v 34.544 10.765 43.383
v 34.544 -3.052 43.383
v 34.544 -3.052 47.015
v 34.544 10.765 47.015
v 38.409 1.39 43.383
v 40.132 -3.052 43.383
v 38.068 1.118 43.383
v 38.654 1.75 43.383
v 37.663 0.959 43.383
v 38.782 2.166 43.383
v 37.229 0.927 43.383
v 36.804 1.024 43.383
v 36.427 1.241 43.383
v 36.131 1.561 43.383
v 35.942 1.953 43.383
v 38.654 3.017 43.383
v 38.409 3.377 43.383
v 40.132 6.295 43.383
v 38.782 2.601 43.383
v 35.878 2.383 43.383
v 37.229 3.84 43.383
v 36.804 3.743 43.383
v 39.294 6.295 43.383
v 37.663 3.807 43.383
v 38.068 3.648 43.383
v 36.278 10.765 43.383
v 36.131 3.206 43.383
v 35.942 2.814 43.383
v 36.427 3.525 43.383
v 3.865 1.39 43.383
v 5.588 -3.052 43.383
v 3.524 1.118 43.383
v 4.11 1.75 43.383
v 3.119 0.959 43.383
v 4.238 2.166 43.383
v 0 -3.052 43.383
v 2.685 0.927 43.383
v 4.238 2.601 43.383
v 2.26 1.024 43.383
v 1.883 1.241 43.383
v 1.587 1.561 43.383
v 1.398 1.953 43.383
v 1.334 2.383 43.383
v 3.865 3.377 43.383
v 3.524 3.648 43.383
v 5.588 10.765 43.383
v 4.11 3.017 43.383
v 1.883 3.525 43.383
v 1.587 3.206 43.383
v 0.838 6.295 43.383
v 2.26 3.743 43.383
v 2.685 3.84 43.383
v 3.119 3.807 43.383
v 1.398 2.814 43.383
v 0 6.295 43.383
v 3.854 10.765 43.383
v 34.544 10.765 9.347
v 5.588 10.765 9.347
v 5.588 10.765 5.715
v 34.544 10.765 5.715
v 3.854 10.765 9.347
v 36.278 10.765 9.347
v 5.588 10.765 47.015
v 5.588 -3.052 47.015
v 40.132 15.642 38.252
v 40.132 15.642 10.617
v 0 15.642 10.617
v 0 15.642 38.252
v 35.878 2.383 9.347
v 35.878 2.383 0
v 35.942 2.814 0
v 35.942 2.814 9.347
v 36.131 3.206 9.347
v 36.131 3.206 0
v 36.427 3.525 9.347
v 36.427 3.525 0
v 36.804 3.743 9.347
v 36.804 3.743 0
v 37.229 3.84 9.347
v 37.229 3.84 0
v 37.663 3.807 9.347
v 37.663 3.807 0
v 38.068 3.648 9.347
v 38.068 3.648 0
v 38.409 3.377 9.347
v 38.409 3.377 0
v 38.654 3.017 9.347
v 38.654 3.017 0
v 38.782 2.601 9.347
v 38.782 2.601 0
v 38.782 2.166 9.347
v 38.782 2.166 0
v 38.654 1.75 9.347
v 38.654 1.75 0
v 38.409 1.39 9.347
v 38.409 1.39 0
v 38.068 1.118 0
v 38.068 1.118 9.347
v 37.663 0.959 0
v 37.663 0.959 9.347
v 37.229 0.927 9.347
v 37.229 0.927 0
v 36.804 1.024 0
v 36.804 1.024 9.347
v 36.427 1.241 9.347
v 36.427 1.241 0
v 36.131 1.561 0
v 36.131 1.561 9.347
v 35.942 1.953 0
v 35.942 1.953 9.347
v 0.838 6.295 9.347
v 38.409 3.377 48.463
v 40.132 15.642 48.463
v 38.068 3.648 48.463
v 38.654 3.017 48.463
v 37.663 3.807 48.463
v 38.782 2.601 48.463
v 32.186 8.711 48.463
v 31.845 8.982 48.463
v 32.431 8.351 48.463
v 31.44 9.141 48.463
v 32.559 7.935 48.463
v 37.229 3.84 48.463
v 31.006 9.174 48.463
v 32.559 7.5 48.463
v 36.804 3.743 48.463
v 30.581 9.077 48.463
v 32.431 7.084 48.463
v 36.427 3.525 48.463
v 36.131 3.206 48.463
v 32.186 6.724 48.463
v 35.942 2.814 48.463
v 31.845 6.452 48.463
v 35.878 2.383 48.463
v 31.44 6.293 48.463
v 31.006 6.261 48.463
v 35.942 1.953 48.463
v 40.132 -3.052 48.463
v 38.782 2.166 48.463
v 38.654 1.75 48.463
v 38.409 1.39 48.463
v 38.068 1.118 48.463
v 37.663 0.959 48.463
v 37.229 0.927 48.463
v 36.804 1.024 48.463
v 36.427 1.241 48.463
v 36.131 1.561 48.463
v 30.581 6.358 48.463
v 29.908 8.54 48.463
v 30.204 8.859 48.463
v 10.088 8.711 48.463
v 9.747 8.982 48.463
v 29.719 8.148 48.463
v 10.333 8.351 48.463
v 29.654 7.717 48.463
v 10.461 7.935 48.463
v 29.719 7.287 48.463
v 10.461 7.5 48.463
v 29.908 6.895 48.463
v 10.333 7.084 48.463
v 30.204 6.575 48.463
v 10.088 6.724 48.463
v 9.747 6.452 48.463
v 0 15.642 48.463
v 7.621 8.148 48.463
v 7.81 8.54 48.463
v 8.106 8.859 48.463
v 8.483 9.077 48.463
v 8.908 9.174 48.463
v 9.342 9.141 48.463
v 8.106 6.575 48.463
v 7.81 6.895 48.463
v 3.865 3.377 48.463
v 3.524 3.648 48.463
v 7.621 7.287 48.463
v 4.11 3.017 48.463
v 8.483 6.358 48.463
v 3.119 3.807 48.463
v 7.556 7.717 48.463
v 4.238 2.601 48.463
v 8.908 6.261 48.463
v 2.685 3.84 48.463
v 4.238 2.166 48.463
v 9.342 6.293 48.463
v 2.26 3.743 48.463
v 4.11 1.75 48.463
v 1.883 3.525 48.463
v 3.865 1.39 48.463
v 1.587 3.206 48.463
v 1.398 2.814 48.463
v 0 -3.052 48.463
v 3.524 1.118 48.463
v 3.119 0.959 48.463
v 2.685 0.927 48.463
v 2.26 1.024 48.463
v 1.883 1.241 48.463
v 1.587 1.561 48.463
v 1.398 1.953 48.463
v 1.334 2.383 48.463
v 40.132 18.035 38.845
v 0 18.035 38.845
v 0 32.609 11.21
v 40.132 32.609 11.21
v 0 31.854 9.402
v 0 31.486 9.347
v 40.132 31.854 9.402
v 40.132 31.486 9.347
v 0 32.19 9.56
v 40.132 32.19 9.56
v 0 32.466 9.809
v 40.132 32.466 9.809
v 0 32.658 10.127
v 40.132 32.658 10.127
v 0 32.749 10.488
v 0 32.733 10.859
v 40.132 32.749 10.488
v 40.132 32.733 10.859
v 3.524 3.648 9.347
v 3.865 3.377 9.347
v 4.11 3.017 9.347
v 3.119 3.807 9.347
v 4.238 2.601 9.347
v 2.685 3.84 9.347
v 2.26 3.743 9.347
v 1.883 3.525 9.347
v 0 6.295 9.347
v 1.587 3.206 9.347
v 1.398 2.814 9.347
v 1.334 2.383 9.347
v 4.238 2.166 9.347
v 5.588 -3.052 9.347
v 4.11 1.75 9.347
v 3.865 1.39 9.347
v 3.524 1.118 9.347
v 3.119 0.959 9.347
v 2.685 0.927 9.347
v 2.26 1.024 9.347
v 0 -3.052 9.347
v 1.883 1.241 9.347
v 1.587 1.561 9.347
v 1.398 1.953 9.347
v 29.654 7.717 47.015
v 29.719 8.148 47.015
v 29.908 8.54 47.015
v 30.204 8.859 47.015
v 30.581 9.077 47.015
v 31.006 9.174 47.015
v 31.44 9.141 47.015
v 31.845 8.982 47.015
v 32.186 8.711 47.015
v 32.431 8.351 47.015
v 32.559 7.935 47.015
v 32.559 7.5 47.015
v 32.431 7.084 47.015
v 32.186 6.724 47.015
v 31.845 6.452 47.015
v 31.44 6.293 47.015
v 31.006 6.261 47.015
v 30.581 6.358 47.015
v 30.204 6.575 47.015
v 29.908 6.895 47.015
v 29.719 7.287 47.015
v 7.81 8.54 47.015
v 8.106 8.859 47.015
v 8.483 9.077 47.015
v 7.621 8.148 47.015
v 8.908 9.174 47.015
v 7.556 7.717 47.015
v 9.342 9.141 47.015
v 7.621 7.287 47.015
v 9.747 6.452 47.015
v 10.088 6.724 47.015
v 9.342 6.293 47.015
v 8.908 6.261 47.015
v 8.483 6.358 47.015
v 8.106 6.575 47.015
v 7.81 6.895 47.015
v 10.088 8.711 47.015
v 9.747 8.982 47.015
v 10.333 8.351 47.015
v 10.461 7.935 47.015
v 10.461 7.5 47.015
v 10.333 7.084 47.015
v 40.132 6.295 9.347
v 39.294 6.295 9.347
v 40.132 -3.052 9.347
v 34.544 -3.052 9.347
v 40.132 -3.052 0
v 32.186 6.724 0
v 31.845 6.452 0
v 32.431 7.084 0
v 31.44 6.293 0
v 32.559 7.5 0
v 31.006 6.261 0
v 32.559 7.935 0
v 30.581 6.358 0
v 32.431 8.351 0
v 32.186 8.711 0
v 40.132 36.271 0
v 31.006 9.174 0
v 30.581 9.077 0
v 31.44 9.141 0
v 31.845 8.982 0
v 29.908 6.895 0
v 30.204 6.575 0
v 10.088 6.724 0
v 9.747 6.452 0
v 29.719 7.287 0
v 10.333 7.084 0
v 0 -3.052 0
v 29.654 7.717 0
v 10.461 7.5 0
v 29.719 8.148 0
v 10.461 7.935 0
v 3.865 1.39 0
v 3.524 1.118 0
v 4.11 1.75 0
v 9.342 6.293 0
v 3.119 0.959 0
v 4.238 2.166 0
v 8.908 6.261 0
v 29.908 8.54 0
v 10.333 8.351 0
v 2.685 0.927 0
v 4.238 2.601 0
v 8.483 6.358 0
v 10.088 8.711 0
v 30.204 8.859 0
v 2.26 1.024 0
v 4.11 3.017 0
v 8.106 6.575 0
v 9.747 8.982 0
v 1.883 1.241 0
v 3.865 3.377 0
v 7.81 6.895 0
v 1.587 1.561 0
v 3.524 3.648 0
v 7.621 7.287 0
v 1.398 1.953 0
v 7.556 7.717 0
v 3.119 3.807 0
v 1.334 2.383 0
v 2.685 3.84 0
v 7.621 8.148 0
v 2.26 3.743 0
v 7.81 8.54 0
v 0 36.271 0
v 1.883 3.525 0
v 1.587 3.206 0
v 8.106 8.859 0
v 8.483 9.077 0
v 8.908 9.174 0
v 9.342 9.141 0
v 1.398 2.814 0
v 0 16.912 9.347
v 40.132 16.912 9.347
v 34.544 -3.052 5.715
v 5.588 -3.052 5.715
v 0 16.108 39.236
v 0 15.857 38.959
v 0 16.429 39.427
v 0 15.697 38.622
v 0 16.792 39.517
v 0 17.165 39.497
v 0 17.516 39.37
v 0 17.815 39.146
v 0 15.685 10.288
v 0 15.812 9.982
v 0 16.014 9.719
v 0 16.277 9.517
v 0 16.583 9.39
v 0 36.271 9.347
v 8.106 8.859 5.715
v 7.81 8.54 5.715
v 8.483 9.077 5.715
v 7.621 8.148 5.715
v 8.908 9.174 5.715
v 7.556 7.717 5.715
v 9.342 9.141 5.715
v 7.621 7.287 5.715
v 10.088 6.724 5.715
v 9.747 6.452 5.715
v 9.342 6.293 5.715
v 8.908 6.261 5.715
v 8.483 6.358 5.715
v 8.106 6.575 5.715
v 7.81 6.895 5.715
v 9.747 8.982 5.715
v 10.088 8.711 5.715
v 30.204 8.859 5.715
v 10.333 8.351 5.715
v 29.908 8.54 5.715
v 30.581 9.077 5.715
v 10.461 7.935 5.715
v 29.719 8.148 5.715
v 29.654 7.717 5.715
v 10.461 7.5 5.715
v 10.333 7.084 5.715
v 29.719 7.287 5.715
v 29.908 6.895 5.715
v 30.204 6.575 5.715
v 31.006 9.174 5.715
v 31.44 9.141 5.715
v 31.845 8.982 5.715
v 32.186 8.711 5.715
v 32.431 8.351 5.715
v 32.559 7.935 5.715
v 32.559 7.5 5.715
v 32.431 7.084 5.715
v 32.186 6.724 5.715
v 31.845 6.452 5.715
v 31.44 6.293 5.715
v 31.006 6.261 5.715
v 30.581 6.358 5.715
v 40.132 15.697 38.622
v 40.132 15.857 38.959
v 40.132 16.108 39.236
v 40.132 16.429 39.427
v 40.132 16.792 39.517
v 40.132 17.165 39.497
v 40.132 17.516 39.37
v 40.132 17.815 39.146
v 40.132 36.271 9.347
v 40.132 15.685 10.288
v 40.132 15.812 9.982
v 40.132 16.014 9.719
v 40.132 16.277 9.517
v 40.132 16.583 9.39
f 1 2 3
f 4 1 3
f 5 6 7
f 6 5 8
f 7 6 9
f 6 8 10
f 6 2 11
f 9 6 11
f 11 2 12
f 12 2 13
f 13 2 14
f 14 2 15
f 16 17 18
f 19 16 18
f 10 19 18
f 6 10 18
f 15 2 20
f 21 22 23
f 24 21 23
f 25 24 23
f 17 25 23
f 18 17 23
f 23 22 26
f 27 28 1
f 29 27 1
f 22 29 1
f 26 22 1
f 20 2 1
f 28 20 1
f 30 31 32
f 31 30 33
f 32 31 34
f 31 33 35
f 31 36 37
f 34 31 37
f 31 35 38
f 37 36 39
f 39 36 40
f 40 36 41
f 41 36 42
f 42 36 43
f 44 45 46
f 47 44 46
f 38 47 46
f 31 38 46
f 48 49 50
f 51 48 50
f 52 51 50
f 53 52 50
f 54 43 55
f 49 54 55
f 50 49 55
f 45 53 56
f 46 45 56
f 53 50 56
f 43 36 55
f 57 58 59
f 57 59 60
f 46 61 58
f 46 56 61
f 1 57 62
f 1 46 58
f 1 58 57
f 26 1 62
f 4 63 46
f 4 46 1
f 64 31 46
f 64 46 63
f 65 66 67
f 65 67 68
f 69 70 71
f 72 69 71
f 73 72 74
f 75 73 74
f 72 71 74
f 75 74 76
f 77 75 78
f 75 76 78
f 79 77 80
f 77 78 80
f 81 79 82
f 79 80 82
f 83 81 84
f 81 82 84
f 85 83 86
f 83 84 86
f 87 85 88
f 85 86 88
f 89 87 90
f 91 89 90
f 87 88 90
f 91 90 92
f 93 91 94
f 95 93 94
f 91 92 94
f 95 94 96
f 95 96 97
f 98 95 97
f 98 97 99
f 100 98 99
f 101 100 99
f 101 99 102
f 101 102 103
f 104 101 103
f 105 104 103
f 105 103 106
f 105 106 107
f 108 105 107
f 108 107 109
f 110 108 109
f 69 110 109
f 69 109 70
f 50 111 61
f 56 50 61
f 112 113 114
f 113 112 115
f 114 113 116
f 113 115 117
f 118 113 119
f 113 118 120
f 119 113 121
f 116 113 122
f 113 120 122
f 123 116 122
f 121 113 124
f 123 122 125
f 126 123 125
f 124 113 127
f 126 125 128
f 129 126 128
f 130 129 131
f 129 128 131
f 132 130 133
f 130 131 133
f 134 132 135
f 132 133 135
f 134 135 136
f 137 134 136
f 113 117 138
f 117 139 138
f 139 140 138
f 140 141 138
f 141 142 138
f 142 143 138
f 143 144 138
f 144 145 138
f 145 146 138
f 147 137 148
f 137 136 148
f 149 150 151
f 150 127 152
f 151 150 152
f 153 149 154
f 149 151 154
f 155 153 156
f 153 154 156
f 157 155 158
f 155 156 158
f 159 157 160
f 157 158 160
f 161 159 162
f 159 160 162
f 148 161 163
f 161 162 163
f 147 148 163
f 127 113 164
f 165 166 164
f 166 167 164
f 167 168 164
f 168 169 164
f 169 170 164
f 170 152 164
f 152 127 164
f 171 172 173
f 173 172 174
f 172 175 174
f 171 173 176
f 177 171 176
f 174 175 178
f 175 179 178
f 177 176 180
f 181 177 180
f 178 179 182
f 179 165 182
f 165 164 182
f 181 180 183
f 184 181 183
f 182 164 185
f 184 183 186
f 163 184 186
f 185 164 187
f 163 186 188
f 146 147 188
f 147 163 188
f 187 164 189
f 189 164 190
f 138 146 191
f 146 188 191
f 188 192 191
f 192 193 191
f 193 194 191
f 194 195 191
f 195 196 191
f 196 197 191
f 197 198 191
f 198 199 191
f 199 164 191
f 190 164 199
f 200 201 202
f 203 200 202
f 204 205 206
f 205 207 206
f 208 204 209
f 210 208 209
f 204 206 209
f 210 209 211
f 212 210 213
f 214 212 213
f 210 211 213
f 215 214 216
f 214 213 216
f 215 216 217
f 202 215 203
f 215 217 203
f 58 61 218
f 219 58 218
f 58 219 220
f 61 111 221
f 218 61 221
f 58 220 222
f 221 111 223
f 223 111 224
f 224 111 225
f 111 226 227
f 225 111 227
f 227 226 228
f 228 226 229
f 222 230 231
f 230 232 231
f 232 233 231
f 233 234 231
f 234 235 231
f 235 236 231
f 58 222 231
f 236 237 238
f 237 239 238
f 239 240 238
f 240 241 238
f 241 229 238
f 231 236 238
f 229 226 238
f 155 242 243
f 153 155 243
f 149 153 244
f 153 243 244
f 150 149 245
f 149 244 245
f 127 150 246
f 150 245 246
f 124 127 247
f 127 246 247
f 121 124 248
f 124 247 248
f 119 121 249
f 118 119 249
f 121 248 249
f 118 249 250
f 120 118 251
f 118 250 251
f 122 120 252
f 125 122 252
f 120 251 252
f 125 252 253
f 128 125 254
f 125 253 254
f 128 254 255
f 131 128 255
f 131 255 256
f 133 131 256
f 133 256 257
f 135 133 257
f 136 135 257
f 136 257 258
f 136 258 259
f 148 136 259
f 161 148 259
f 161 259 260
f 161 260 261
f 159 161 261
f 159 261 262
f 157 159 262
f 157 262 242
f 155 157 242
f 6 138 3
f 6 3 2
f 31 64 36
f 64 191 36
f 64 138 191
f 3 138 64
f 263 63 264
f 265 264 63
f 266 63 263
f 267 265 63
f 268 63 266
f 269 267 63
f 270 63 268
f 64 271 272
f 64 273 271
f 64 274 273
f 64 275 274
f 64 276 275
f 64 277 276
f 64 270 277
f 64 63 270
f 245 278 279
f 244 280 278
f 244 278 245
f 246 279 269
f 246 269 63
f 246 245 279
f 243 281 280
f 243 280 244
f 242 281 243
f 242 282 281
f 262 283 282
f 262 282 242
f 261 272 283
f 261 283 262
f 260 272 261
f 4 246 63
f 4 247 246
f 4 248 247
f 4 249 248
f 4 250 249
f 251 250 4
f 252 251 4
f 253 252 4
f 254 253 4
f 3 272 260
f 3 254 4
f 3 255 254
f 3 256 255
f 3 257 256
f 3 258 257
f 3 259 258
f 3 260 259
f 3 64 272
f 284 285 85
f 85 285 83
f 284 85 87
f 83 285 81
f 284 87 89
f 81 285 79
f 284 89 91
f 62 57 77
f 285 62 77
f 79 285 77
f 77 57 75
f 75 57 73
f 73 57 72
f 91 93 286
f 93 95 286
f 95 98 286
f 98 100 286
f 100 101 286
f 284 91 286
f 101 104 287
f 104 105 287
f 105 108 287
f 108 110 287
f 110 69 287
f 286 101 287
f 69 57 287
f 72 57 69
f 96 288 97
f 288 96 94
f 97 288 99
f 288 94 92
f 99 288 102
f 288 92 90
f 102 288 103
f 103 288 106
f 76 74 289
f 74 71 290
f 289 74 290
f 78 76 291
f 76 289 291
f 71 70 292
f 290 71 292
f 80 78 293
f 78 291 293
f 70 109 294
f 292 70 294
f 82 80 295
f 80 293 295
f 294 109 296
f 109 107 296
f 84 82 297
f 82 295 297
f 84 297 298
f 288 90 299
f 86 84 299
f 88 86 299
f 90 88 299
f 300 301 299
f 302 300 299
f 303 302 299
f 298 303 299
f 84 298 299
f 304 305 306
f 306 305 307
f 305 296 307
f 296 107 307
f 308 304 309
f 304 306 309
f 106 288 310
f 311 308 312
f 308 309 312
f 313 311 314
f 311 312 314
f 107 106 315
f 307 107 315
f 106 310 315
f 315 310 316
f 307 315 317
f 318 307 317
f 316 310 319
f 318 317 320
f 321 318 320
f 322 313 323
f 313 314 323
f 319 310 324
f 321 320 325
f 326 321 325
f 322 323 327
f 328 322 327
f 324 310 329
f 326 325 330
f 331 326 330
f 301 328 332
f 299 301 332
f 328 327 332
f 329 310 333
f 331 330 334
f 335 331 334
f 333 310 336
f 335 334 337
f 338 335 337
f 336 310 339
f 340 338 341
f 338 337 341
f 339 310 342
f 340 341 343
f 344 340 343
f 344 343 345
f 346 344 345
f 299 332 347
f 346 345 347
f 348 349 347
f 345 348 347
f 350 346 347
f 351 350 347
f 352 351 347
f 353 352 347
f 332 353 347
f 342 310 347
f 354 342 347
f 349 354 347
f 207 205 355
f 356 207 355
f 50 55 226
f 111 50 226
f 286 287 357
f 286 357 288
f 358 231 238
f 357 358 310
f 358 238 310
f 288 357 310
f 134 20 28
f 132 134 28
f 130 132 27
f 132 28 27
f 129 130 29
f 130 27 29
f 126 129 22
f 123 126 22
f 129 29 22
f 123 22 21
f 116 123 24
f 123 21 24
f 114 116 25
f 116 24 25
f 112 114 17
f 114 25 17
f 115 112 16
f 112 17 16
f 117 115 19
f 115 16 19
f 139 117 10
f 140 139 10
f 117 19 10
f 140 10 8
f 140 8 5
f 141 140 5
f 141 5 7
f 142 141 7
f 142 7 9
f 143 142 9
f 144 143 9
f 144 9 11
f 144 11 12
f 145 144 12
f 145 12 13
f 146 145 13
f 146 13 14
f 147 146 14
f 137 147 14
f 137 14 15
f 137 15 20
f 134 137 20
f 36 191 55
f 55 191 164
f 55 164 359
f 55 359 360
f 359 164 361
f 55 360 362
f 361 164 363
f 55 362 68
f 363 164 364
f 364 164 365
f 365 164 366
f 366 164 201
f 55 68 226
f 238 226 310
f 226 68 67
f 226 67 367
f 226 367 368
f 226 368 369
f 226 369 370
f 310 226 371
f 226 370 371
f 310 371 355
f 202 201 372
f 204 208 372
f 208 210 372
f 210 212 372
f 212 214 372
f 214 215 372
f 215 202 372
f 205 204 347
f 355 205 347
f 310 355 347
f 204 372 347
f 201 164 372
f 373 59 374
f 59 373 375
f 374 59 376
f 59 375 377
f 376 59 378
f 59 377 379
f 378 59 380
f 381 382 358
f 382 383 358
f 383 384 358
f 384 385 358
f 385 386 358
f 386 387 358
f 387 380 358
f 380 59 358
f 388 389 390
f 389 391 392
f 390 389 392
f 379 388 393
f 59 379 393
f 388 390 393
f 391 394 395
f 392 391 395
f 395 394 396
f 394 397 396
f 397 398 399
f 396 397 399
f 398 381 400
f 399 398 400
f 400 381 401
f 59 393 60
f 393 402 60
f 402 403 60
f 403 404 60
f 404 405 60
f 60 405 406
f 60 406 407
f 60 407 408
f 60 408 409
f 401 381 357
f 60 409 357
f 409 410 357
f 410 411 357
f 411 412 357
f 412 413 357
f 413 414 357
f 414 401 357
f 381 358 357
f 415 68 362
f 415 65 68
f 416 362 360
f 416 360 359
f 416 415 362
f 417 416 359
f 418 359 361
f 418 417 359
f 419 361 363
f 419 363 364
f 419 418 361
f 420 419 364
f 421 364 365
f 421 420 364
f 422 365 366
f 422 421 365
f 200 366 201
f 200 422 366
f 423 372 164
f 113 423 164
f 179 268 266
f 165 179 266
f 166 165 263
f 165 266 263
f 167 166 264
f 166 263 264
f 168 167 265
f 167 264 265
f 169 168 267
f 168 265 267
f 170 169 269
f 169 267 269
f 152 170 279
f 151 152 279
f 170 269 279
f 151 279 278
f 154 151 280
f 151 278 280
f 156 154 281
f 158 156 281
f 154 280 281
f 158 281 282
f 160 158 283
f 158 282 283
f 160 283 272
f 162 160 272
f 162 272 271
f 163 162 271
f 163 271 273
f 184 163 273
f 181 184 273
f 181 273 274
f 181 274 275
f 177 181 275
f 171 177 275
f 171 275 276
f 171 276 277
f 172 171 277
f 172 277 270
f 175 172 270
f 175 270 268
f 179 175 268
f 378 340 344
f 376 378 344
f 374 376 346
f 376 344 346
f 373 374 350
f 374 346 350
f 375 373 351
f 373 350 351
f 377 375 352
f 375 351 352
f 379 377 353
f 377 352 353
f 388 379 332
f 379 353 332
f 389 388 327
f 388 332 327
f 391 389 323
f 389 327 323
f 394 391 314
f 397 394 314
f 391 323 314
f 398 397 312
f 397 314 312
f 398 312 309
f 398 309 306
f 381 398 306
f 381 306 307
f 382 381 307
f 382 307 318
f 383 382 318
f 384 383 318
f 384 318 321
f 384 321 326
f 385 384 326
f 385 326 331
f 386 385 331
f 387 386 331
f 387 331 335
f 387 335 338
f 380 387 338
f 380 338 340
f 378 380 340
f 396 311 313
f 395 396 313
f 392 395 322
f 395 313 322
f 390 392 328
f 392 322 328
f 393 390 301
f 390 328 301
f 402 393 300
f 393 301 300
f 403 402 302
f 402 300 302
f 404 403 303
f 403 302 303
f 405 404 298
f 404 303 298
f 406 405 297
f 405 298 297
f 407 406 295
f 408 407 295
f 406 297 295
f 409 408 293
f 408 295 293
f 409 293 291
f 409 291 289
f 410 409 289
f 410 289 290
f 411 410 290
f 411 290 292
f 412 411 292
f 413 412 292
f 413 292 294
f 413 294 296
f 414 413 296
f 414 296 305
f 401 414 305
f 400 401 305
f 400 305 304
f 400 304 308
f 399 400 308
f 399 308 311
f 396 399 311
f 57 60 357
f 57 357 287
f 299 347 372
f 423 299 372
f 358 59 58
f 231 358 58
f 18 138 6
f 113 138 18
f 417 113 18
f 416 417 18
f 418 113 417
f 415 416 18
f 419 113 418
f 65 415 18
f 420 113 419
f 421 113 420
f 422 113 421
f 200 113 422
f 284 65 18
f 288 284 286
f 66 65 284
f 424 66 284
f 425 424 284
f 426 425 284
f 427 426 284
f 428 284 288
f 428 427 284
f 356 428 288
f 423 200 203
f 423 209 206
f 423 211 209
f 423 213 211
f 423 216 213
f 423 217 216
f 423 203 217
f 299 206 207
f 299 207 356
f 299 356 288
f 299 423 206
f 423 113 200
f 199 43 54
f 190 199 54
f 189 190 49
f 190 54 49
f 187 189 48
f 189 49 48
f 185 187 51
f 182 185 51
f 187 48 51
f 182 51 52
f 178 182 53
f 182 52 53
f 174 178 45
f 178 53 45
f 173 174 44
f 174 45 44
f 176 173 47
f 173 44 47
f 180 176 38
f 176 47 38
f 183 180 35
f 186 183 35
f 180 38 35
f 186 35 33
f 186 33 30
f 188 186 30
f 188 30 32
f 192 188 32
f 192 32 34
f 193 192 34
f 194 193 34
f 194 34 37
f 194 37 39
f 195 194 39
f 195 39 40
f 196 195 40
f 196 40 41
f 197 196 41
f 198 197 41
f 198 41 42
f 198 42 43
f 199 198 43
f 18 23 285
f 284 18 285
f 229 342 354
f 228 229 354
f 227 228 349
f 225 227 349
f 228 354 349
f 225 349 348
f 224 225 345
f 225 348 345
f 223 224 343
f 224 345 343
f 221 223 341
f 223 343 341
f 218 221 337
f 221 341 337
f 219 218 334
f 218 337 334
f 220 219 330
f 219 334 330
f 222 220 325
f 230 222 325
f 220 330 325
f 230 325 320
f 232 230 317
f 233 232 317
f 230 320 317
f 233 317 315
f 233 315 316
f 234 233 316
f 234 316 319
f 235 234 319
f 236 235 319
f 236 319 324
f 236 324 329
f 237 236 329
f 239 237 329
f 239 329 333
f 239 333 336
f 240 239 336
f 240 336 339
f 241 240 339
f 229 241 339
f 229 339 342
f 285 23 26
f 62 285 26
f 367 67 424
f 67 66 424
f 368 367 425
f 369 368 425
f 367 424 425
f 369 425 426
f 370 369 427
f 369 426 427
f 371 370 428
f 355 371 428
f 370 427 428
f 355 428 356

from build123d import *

# Parameters (mm, degrees)
BOSS_EXTRUDE1_DEPTH = 40.132
FILLET1_R           = 1.27
SKETCH2_W           = 28.2956
SKETCH2_H           = 34.036
CUT_EXTRUDE1_DEPTH  = 4.4704
CHAMFER1_SIZE       = 5.08
CHAMFER1_SIZE_2     = 7.53140972
SKETCH3_R           = 1.4605
CUT_EXTRUDE2_DEPTH  = 73.627884767
CUT_EXTRUDE4_REACH  = 76.199
SKETCH4_W           = 28.956
SKETCH4_H           = 41.3004


with BuildPart() as part:
    # Sketch1 → Boss-Extrude1 (new body)
    with BuildSketch(Plane(origin=(0, 0, 0), x_dir=(0, 0, -1), z_dir=(1, 0, 0))):
        Polygon((0, -3.052283086), (0, 36.270517883), (-9.3472, 36.270517883), (-48.4632, 15.642116914), (-48.4632, -3.052283086), (-43.3832, -3.052283086), (-43.3832, 6.294916914), (-9.3472, 6.294916914), (-9.3472, -3.052283086), align=None)
        Polygon((-43.3832, 15.642116914), (-9.3472, 33.59150477), (-9.3472, 15.642116914), align=None, mode=Mode.SUBTRACT)
    extrude(amount=BOSS_EXTRUDE1_DEPTH)

    # Fillet1
    fillet1_edges = [part.edges().sort_by_distance(p)[0] for p in [
        (20.066, 15.642116914, 43.3832),
        (20.066, 15.642116914, 9.3472),
        (20.066, 33.59150477, 9.3472),
    ]]
    fillet(fillet1_edges, radius=FILLET1_R)

    # Sketch2 → Cut-Extrude1 (cut)
    with BuildSketch(Plane.XZ.offset(-6.294916914)):
        with Locations((20.066, 26.3652)):
            Rectangle(SKETCH2_W, SKETCH2_H)
    extrude(amount=-CUT_EXTRUDE1_DEPTH, mode=Mode.SUBTRACT)

    # Chamfer1
    # the kernel refuses this chamfer: 7.53140972, 5.08 mm, written as the material it takes off along each edge
    with BuildSketch(Plane(origin=(5.9182, 6.294916914, 9.3472), x_dir=(-0.9988697089125115, -0.04753214298802862, 0), z_dir=(0, 0, 1))) as chamfer1_piece_1_section:
        Polygon((CHAMFER1_SIZE * 0.998869708913, -CHAMFER1_SIZE * 0.047532142988), (-CHAMFER1_SIZE_2 * 0.0475321429883, -CHAMFER1_SIZE_2 * 0.998869708918), (0, 0), align=None)
    chamfer1_piece_1 = extrude(amount=34.036, mode=Mode.PRIVATE)
    chamfer1_piece_1 = split(chamfer1_piece_1, bisect_by=Plane(origin=(4.025982399, 10.765316914, 26.3652), z_dir=(0, -1, 0)), keep=Keep.TOP, mode=Mode.PRIVATE)
    add(chamfer1_piece_1, mode=Mode.SUBTRACT)
    with BuildSketch(Plane(origin=(34.2138, 6.294916914, 43.3832), x_dir=(0.9988697089125117, -0.0475321429880285, 0), z_dir=(0, 0, -1))) as chamfer1_piece_2_section:
        Polygon((CHAMFER1_SIZE * 0.998869708913, -CHAMFER1_SIZE * 0.047532142988), (-CHAMFER1_SIZE_2 * 0.0475321429883, -CHAMFER1_SIZE_2 * 0.998869708918), (0, 0), align=None)
    chamfer1_piece_2 = extrude(amount=34.036, mode=Mode.PRIVATE)
    chamfer1_piece_2 = split(chamfer1_piece_2, bisect_by=Plane(origin=(36.106017601, 10.765316914, 26.3652), z_dir=(0, -1, 0)), keep=Keep.TOP, mode=Mode.PRIVATE)
    add(chamfer1_piece_2, mode=Mode.SUBTRACT)

    # Sketch3 → Cut-Extrude2 (cut, through all)
    with BuildSketch(Plane(origin=(0, 0, 0), x_dir=(-1, 0, 0), z_dir=(0, 0, -1))):
        with Locations((-37.338, 2.383316914)):
            Circle(SKETCH3_R)
        with Locations((-31.115, 7.717316914)):
            Circle(SKETCH3_R)
        with Locations((-9.017, 7.717316914)):
            Circle(SKETCH3_R)
        with Locations((-2.794, 2.383316914)):
            Circle(SKETCH3_R)
    extrude(amount=-CUT_EXTRUDE2_DEPTH, mode=Mode.SUBTRACT)

    # Cut-Extrude4: up to this face of the body (flat: up to its plane)
    cut_extrude4_end = Plane(part.part.faces().sort_by_distance((20.066, 10.765316914, 26.3652))[0])
    # Sketch4 → Cut-Extrude4 (cut, up to the picked face)
    with BuildSketch(Plane.XZ.offset(3.052283086), mode=Mode.PRIVATE) as cut_extrude4_sk1:
        with Locations((20.066, 26.3652)):
            Rectangle(SKETCH4_W, SKETCH4_H)
    cut_extrude4_tool1 = split(extrude(cut_extrude4_sk1.sketch, amount=-CUT_EXTRUDE4_REACH, mode=Mode.PRIVATE), bisect_by=cut_extrude4_end, keep=Keep.BOTH, mode=Mode.PRIVATE)
    add(cut_extrude4_tool1.solids().sort_by(Axis((20.066, -3.052283, 26.3652), (0, 1, 0)))[0], mode=Mode.SUBTRACT)


solid = part.part
